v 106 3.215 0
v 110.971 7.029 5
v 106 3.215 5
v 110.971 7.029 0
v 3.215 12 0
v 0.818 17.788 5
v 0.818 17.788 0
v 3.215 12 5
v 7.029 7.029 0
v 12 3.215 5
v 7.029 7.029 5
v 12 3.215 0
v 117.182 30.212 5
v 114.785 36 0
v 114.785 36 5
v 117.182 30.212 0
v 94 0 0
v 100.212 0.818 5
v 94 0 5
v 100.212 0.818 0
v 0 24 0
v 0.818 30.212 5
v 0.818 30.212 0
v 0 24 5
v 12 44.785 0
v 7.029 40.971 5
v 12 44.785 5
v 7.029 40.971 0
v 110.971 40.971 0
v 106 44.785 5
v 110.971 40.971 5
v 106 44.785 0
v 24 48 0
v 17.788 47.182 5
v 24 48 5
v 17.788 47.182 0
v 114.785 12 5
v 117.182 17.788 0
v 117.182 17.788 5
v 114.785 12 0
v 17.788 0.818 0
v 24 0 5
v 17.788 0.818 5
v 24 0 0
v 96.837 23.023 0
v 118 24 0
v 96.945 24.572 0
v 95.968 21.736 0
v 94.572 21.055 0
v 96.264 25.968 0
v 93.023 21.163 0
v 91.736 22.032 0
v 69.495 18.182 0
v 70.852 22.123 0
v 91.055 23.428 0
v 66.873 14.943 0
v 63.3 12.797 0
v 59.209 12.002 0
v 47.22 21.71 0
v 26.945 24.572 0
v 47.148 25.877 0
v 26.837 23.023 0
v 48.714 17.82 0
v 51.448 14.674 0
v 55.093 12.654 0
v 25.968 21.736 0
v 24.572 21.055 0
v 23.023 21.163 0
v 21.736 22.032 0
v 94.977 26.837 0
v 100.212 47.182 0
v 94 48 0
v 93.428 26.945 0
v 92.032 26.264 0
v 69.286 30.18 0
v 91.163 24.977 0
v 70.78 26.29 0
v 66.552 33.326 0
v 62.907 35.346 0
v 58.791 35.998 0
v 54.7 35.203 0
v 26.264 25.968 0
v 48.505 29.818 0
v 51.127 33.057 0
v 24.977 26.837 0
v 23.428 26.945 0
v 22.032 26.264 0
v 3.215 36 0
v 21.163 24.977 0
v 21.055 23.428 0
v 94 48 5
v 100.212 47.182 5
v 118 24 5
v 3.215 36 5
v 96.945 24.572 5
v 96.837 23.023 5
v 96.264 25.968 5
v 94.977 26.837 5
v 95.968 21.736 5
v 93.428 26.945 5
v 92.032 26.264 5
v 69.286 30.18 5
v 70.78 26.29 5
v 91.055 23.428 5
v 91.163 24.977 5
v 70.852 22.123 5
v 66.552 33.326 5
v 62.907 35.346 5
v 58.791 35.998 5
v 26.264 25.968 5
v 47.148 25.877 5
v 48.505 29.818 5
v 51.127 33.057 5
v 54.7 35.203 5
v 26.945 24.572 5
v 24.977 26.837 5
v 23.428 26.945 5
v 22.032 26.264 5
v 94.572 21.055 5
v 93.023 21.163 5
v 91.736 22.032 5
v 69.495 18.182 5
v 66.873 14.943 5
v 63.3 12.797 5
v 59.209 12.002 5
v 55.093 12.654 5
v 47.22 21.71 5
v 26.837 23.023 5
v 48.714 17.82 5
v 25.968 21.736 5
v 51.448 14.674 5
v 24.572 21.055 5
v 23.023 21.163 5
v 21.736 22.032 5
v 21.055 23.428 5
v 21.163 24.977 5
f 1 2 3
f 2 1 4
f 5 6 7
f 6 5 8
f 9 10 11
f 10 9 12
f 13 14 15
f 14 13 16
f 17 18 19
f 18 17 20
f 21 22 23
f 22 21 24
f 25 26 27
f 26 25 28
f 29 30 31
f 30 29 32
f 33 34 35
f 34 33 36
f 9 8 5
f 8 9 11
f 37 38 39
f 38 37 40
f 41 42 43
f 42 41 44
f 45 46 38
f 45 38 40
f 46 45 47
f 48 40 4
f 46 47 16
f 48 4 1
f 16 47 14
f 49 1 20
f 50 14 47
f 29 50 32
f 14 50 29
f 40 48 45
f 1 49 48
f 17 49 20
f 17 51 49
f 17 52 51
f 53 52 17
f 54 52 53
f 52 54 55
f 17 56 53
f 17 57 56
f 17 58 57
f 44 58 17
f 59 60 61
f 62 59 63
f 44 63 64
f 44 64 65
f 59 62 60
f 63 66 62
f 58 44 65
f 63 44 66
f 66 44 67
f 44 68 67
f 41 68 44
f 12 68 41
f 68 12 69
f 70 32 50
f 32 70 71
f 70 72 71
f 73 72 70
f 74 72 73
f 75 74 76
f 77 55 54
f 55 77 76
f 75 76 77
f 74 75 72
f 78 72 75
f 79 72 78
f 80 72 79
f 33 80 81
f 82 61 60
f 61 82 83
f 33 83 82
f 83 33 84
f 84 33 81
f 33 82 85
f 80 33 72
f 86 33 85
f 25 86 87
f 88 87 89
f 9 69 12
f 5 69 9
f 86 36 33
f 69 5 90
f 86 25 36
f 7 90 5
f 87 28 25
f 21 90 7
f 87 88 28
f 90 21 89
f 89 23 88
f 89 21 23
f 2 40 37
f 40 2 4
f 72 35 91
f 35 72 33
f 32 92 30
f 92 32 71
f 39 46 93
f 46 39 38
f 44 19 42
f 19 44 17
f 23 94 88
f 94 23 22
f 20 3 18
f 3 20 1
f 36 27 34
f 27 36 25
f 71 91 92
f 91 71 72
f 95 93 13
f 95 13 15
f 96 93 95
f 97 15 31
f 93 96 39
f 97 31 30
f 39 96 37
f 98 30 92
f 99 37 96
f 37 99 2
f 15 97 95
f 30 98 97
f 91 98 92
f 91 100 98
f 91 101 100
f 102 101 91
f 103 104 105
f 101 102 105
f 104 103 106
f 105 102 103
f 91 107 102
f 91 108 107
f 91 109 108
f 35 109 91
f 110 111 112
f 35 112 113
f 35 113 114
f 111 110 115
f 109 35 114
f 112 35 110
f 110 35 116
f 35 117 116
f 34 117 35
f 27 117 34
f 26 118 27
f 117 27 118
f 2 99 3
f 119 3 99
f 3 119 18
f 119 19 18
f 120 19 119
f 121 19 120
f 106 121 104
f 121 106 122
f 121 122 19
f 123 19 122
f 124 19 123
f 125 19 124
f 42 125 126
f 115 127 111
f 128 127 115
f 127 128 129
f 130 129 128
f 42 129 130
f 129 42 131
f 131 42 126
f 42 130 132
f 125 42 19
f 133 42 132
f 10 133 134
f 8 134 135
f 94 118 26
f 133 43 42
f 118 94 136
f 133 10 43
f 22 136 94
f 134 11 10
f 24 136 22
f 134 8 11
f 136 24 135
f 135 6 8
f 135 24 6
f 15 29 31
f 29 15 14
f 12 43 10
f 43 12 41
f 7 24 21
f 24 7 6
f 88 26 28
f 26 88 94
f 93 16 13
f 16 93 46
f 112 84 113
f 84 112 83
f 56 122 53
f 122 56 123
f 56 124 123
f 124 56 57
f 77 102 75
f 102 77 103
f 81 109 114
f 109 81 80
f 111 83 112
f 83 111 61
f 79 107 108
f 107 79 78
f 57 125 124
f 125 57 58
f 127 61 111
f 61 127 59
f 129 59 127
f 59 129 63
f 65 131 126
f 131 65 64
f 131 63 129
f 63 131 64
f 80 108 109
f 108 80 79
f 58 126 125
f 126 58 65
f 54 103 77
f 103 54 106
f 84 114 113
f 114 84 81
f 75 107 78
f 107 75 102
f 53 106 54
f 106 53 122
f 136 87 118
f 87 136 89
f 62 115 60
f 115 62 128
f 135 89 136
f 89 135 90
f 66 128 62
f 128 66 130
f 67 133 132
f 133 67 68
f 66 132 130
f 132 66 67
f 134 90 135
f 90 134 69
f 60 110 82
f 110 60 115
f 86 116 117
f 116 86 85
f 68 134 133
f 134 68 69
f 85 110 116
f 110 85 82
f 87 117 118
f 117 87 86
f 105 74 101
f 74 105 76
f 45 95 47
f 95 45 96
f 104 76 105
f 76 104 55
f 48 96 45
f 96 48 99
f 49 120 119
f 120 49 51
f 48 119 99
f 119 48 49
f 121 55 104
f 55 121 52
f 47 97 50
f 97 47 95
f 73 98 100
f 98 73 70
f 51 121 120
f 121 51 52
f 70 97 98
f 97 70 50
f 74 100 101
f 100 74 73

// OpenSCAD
$fn = 32;

// ----------------------------------------------------------------------
// Spacer plate: obround span 70, caps R24
// ----------------------------------------------------------------------

// --- parameters (mm) ---
bore_r = 12;              // centre bore radius
bolt_r = 3;               // bolt hole radius
plate_t = 5;              // plate thickness, Z (extrusion height)
span = 70;                // obround span
cap_r = 24;               // cap radius

profile = [[24, 48], [17.788, 47.182], [12, 44.785], [7.029, 40.971], [3.215, 36], [0.818, 30.212], [0, 24], [0.818, 17.788], [3.215, 12], [7.029, 7.029], [12, 3.215], [17.788, 0.818], [24, 0], [94, 0], [100.212, 0.818], [106, 3.215], [110.971, 7.029], [114.785, 12], [117.182, 17.788], [118, 24], [117.182, 30.212], [114.785, 36], [110.971, 40.971], [106, 44.785], [100.212, 47.182], [94, 48]];  // primary outline, 26 points, counter clockwise
void_1 = [[70.78, 26.29], [69.286, 30.18], [66.552, 33.326], [62.907, 35.346], [58.791, 35.998], [54.7, 35.203], [51.127, 33.057], [48.505, 29.818], [47.148, 25.877], [47.22, 21.71], [48.714, 17.82], [51.448, 14.674], [55.093, 12.654], [59.209, 12.002], [63.3, 12.797], [66.873, 14.943], [69.495, 18.182], [70.852, 22.123]];  // centre bore, 18 points
void_2 = [[26.945, 24.572], [26.264, 25.968], [24.977, 26.837], [23.428, 26.945], [22.032, 26.264], [21.163, 24.977], [21.055, 23.428], [21.736, 22.032], [23.023, 21.163], [24.572, 21.055], [25.968, 21.736], [26.837, 23.023]];  // end hole, 12 points
void_3 = [[96.945, 24.572], [96.264, 25.968], [94.977, 26.837], [93.428, 26.945], [92.032, 26.264], [91.163, 24.977], [91.055, 23.428], [91.736, 22.032], [93.023, 21.163], [94.572, 21.055], [95.968, 21.736], [96.837, 23.023]];  // end hole, 12 points

// --- the one profile operation ---
difference() {
  linear_extrude(height = plate_t) polygon(points = profile);
  translate([0, 0, -1])
    linear_extrude(height = plate_t + 2) polygon(points = void_1);
  translate([0, 0, -1])
    linear_extrude(height = plate_t + 2) polygon(points = void_2);
  translate([0, 0, -1])
    linear_extrude(height = plate_t + 2) polygon(points = void_3);
}
